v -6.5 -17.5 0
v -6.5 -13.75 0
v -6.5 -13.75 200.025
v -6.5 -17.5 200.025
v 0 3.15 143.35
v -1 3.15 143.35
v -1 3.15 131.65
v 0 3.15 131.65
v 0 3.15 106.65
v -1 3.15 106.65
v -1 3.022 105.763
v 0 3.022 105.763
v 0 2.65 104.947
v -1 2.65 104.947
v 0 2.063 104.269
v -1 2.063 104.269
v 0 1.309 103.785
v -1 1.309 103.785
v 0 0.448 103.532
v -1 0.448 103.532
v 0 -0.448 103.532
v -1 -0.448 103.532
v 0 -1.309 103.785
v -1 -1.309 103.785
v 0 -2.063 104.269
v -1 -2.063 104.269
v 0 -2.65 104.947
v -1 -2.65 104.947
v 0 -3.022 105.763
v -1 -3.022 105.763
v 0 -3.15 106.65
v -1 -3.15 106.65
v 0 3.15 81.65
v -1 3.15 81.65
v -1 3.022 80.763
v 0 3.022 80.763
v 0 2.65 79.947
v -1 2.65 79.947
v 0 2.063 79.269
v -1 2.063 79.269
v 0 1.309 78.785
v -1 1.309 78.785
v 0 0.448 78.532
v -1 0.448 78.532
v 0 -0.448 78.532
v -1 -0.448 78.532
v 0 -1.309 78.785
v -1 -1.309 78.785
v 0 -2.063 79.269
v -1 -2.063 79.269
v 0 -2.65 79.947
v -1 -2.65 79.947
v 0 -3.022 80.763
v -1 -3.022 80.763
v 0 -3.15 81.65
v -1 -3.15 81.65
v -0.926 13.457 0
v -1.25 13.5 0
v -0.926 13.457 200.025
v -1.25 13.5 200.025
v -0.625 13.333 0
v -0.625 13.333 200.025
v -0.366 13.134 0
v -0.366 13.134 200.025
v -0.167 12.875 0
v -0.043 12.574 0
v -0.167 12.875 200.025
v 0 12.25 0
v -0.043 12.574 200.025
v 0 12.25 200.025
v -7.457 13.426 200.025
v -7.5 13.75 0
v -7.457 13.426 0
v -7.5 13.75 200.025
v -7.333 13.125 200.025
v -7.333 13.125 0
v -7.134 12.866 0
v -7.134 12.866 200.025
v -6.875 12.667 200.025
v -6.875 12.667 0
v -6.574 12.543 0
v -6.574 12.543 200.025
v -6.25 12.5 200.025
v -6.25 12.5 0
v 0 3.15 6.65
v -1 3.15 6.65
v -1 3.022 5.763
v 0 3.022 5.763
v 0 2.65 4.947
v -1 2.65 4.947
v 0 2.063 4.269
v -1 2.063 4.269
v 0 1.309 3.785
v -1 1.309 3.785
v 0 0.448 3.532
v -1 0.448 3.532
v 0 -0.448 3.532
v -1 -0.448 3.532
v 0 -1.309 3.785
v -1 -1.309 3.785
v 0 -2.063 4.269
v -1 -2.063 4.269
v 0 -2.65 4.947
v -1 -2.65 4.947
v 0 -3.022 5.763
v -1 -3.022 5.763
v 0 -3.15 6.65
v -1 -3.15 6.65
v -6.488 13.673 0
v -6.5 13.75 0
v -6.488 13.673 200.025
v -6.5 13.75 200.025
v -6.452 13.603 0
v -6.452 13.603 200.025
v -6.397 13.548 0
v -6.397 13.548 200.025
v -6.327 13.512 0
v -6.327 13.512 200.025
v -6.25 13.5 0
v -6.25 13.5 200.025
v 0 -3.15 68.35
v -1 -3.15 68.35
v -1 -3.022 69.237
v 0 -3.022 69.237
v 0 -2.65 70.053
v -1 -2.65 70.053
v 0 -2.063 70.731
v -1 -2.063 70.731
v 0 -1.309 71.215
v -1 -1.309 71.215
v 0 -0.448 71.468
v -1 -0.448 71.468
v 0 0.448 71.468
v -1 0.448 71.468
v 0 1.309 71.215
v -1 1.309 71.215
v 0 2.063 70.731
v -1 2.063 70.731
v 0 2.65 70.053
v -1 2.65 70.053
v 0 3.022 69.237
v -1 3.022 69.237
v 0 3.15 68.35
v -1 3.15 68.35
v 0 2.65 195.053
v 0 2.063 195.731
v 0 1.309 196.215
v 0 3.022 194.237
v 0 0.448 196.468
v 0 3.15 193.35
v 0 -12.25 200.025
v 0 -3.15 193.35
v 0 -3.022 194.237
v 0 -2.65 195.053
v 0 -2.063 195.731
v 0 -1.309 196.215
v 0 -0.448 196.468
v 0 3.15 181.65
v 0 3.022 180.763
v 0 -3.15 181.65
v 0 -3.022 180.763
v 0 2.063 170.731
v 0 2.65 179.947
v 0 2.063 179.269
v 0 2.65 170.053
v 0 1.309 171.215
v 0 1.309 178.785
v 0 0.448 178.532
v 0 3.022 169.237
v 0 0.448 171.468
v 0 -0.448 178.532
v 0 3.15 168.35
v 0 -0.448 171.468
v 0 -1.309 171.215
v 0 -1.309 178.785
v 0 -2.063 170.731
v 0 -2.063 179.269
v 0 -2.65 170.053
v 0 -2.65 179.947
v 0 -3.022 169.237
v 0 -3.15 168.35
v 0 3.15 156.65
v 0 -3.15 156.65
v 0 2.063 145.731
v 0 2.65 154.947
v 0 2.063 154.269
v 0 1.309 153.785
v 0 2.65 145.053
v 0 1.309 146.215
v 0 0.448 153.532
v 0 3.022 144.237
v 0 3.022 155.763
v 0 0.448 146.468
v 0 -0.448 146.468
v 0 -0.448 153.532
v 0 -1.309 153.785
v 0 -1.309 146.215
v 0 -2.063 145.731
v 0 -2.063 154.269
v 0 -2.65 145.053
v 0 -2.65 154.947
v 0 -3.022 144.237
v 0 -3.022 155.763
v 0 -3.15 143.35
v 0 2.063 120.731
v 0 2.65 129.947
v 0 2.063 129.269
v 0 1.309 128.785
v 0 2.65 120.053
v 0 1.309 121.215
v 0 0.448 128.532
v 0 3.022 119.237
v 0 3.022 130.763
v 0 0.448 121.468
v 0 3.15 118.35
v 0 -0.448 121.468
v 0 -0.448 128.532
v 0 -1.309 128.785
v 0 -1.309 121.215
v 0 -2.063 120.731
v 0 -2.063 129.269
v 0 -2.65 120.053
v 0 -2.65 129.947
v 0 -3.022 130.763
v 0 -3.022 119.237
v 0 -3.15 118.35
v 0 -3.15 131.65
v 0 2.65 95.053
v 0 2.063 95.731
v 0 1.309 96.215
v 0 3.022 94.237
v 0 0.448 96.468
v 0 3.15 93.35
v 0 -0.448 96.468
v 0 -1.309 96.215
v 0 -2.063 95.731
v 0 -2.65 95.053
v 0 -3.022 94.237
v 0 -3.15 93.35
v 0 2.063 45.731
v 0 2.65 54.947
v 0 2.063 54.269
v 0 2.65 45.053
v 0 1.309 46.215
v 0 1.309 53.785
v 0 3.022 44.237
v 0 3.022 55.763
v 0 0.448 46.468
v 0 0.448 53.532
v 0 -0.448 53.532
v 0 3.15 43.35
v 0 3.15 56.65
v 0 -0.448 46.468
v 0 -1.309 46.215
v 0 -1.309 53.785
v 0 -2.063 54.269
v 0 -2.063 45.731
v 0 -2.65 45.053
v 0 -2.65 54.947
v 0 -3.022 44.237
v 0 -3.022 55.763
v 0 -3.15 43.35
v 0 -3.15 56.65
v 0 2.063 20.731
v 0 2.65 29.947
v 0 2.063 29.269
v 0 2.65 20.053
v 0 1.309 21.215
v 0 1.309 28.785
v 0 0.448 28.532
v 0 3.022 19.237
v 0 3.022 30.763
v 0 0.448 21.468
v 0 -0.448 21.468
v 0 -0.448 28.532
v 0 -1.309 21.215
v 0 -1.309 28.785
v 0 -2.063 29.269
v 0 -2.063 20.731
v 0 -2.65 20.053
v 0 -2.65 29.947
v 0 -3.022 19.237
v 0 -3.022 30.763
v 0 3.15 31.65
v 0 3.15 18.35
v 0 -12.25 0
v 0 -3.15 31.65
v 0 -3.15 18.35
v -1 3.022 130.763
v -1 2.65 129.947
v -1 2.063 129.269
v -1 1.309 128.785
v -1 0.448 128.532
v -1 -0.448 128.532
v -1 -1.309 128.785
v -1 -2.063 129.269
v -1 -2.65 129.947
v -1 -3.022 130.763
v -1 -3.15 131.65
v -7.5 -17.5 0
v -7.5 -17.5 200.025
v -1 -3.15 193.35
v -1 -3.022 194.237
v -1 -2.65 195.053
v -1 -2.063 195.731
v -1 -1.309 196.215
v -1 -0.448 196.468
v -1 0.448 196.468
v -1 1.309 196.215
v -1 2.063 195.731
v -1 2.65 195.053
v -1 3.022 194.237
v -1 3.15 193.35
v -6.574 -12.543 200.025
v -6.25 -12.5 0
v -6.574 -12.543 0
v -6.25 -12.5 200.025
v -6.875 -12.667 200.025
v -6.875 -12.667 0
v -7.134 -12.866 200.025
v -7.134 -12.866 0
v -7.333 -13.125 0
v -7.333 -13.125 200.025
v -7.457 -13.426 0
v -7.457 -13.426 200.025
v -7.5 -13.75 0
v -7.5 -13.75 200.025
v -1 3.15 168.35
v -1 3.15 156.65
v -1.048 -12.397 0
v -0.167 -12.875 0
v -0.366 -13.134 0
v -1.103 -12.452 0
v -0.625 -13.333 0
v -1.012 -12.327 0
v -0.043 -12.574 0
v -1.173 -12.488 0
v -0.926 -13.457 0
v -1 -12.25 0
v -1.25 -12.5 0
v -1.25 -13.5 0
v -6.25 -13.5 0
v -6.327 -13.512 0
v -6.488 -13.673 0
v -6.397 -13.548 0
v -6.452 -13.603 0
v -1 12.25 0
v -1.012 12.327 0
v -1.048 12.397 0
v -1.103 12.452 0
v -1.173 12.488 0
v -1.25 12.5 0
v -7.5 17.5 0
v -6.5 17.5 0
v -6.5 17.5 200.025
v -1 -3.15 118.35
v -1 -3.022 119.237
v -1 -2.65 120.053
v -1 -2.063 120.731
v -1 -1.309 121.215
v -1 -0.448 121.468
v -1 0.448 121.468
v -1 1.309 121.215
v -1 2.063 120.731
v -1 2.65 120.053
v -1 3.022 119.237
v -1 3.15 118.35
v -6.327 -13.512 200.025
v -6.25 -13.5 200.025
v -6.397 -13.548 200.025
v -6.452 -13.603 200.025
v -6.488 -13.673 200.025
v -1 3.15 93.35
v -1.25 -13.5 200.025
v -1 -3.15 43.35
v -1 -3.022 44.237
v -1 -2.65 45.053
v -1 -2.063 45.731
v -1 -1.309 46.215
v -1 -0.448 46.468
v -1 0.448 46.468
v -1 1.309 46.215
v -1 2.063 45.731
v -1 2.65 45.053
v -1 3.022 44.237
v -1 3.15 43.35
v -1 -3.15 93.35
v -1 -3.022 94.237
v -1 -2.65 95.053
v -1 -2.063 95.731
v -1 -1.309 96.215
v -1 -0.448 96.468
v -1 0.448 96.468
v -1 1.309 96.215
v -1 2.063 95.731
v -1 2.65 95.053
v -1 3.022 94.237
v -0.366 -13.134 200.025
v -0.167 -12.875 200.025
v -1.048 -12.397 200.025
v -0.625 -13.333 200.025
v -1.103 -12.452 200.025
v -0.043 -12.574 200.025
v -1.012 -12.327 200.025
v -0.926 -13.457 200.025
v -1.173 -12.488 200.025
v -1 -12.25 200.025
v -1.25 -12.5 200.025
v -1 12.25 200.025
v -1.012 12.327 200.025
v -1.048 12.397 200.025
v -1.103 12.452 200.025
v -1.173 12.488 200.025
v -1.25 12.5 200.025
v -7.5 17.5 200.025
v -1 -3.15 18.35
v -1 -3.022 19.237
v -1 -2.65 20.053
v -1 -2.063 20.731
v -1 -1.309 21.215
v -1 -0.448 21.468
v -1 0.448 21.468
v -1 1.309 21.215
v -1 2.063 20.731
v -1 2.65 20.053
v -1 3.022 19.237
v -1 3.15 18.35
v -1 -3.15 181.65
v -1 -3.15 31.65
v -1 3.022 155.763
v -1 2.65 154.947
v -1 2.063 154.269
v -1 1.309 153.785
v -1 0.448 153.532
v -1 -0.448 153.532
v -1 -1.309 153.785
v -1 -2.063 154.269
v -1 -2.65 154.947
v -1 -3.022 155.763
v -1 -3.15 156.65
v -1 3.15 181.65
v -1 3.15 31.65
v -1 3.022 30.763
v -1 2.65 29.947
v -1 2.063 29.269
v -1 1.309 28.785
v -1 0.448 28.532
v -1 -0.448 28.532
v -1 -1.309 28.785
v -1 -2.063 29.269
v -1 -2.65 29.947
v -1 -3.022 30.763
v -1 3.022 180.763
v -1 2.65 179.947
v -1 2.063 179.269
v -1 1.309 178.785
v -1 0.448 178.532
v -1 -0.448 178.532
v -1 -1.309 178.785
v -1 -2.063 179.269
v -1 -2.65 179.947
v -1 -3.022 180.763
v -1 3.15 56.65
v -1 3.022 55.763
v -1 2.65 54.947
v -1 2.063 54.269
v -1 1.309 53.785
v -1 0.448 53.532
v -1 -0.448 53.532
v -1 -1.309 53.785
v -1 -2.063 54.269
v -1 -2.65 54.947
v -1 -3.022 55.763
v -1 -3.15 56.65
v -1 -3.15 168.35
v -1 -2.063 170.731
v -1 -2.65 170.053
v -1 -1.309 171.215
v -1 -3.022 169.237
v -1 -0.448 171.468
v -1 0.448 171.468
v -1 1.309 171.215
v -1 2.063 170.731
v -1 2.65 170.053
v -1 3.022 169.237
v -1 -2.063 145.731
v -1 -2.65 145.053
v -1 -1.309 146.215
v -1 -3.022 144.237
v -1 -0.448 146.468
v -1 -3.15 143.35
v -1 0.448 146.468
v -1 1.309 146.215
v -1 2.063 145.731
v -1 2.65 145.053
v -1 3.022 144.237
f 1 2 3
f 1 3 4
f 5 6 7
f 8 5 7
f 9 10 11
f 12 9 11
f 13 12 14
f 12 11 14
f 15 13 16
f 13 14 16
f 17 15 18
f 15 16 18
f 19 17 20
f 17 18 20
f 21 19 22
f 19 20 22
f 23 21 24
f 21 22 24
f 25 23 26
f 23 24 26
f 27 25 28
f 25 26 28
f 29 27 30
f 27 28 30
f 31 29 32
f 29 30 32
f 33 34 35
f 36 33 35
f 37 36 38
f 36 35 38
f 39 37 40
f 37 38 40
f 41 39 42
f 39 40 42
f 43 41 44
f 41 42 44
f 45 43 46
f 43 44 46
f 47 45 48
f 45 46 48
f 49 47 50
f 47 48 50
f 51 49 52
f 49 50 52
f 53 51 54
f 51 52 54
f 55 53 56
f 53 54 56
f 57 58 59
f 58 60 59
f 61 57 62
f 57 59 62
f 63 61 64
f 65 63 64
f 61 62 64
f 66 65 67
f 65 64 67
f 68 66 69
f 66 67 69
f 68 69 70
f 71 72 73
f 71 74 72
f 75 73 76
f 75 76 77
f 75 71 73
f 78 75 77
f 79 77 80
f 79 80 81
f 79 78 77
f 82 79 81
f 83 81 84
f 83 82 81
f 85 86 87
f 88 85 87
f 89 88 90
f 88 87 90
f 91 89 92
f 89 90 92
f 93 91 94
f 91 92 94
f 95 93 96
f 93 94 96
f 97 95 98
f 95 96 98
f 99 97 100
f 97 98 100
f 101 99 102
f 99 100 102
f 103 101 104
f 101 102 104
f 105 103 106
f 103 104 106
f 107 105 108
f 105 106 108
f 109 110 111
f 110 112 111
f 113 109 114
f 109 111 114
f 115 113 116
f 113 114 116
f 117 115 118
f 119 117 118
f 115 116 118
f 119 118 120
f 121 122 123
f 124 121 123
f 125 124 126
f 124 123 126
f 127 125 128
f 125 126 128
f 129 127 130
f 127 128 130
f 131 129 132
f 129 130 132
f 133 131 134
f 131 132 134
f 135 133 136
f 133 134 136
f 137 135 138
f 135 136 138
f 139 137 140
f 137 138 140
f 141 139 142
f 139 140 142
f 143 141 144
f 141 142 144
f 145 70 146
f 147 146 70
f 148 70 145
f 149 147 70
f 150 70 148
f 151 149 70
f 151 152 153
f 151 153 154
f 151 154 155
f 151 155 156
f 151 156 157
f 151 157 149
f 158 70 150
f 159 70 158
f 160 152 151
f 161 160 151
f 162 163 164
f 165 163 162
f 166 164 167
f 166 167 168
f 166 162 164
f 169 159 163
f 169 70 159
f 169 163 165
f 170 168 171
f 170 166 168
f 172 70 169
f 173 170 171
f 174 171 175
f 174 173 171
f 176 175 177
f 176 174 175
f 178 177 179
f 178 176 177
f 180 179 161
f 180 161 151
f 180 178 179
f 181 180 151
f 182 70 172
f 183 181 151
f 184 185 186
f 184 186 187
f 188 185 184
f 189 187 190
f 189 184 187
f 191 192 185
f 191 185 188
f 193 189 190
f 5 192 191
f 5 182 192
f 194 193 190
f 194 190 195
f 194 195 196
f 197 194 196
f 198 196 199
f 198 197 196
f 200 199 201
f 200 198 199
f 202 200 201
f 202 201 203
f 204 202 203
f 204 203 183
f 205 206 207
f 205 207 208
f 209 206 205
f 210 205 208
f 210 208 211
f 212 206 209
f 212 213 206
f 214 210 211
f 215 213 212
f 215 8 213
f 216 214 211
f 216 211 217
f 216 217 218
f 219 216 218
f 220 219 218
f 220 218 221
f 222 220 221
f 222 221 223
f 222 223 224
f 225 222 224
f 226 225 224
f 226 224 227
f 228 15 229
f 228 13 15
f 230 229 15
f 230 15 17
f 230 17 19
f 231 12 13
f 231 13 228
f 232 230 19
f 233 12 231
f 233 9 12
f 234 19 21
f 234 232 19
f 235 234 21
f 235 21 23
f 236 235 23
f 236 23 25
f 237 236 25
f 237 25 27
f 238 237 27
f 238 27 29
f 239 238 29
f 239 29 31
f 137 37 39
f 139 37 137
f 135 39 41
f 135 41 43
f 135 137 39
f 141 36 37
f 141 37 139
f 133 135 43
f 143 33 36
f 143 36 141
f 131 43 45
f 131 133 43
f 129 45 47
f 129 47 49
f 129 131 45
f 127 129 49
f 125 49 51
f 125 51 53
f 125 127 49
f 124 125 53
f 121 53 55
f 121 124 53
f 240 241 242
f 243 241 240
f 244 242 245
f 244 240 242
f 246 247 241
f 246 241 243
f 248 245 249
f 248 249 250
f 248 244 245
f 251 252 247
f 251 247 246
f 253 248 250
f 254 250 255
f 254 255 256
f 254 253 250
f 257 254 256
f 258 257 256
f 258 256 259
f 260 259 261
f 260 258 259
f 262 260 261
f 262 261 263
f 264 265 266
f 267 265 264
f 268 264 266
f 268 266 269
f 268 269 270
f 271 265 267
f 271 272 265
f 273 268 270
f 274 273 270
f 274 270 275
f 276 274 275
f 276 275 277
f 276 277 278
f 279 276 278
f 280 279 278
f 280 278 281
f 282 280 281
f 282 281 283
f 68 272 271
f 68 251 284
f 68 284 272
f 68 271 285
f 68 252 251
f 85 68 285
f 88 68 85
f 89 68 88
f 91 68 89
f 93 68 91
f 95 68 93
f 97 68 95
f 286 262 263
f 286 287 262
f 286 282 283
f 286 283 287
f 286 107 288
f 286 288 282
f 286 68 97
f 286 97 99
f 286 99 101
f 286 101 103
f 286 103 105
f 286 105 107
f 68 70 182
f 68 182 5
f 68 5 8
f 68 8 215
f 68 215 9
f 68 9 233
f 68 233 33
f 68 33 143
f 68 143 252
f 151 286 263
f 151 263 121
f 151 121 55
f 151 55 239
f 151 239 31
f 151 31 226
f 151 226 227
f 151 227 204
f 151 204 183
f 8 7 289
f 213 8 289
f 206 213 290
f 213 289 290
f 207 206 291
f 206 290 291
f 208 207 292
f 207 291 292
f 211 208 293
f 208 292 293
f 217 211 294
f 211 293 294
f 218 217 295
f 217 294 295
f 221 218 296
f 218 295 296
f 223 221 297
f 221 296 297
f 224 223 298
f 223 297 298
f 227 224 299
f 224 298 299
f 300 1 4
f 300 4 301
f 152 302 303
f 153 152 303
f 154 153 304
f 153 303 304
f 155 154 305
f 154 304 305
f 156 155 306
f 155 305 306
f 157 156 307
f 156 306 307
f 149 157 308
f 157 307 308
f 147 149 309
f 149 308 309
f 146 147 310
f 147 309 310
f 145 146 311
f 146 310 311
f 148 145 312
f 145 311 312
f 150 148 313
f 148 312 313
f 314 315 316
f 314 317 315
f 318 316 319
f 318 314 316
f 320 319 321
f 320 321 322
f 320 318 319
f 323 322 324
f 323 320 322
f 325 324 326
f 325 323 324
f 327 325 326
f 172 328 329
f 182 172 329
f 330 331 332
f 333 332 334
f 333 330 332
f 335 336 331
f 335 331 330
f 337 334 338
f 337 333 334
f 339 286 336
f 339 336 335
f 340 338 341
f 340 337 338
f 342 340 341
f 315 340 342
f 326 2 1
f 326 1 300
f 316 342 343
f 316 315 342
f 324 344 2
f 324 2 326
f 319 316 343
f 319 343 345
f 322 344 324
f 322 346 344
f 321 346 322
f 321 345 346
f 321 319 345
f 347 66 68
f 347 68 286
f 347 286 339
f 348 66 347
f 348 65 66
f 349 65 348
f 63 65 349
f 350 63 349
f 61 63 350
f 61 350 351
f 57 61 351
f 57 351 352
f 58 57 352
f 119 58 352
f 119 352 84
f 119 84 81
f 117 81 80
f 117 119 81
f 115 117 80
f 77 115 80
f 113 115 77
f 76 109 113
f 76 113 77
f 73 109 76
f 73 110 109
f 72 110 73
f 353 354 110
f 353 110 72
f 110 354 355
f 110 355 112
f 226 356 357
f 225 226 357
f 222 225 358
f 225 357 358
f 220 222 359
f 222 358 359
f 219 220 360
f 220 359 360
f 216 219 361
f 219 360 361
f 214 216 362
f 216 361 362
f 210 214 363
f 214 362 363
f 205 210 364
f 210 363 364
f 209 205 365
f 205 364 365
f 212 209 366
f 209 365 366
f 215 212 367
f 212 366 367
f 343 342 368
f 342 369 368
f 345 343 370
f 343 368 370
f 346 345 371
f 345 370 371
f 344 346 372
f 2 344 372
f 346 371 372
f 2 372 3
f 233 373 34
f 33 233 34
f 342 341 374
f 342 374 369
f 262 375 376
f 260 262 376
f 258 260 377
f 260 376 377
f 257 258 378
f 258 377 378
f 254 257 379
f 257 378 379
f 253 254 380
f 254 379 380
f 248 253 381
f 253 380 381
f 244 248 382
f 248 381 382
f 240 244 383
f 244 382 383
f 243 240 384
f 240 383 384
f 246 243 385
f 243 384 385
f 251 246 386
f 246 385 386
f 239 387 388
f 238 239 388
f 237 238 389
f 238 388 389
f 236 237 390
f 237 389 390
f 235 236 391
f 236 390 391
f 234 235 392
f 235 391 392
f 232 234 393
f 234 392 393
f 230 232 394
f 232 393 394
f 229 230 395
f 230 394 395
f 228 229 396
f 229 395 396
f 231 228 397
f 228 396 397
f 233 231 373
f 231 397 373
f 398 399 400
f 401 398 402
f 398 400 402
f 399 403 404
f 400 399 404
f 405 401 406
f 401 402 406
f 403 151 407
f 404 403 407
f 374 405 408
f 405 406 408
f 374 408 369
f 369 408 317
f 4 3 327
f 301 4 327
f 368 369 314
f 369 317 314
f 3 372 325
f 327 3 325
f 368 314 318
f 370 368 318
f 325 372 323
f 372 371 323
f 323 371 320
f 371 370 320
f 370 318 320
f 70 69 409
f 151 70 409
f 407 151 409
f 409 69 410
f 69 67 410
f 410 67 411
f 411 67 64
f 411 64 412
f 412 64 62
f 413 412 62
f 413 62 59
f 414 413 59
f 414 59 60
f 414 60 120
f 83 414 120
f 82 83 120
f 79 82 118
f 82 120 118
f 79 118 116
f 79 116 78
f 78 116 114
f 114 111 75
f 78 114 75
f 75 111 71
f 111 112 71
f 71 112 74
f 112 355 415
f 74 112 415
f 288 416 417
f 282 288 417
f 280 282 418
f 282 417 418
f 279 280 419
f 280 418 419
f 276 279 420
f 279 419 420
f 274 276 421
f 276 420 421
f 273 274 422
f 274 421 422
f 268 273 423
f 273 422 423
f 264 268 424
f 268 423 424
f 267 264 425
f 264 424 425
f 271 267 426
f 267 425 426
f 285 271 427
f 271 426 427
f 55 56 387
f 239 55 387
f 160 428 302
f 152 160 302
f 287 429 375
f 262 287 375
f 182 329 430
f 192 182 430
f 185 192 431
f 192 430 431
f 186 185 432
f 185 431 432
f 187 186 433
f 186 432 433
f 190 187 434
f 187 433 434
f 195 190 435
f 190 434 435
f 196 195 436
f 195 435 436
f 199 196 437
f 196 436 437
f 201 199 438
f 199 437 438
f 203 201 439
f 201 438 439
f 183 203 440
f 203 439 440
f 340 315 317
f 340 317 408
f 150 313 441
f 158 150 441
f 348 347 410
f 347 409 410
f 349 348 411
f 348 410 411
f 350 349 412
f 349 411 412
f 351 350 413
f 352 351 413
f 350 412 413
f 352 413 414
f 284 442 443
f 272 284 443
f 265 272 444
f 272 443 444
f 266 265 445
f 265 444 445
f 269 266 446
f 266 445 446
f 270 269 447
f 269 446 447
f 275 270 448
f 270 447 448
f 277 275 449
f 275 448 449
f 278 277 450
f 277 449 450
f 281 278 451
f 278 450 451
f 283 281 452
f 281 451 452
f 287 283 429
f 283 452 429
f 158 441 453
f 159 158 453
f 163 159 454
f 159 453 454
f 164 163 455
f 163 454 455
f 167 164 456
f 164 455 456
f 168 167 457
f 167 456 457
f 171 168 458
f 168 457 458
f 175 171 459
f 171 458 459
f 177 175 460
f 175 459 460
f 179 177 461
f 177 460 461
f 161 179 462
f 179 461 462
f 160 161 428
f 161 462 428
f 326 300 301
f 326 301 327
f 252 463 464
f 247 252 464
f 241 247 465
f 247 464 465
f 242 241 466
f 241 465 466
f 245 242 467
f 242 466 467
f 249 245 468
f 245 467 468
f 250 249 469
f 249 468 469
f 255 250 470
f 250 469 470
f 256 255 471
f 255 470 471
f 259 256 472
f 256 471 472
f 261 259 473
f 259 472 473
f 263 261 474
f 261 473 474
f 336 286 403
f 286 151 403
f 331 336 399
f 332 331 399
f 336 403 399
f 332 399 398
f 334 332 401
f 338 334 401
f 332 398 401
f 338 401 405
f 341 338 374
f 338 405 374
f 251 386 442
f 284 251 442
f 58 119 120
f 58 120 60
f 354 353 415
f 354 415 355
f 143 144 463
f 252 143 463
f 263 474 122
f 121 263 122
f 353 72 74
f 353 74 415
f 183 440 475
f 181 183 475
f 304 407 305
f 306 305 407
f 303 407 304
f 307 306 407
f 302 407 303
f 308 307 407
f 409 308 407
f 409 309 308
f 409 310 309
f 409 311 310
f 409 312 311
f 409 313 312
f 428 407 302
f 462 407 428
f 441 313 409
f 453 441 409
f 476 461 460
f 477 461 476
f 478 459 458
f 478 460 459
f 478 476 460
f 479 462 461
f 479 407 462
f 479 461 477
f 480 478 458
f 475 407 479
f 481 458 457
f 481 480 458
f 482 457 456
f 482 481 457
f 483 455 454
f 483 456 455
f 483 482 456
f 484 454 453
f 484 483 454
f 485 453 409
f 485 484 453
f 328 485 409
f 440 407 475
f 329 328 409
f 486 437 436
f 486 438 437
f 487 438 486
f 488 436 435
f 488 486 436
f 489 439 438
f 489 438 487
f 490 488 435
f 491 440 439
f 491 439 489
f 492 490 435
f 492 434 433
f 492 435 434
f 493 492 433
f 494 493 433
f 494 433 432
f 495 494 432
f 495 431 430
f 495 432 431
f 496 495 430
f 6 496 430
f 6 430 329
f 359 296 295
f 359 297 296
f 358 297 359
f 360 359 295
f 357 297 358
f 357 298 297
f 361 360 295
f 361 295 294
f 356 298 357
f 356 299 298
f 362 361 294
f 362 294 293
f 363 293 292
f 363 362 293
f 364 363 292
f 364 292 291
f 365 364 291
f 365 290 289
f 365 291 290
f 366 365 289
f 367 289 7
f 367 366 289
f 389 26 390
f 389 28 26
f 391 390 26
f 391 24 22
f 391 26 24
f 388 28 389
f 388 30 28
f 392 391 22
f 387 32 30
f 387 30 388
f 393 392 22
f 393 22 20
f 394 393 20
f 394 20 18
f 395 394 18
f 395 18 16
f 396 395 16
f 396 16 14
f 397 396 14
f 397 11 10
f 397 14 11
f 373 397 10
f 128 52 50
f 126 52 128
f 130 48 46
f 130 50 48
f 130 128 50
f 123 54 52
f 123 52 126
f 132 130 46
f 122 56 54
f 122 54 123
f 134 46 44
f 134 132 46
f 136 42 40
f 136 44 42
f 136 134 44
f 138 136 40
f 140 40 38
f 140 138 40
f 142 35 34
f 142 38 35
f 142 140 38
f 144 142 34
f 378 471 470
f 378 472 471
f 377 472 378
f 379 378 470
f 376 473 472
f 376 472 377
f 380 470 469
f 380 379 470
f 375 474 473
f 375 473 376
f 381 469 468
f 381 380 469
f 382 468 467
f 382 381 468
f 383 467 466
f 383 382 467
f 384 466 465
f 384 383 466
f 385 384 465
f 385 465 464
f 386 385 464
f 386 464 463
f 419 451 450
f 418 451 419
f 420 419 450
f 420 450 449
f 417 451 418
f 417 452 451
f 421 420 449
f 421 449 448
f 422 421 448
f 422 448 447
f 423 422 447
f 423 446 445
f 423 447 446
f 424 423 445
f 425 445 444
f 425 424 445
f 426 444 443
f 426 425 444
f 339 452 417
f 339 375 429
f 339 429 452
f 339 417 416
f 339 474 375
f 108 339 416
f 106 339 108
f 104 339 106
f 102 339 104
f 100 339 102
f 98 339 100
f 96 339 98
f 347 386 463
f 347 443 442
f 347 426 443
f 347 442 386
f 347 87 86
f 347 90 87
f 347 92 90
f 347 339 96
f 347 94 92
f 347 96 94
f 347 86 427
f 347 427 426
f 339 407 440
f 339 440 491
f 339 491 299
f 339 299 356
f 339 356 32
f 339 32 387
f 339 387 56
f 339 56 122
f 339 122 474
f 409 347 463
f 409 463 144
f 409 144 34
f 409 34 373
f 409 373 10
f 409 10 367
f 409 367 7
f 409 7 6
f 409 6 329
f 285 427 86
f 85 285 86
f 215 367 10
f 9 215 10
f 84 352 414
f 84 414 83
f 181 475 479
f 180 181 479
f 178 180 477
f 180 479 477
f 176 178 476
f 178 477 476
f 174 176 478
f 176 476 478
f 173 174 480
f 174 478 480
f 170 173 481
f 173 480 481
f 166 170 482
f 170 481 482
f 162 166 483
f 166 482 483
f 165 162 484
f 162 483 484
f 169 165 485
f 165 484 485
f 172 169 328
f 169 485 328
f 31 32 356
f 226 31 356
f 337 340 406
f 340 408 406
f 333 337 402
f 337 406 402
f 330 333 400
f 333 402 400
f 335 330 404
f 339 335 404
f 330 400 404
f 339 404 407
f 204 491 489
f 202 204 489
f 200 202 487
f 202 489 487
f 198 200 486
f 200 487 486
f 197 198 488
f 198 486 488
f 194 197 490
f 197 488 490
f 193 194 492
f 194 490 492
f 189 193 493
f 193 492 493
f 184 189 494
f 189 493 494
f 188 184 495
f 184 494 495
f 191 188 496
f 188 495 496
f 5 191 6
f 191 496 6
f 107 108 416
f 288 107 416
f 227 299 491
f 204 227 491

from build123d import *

# Parameters (mm, degrees)
EXTRUDE_THIN1_DEPTH = 200.025
CUT_EXTRUDE1_START  = -8.5
CUT_EXTRUDE1_DEPTH  = 9.5
LPATTERN1_COUNT     = 32
LPATTERN1_PITCH     = 25
FILLET1_R           = 0.25
FILLET2_R           = 1.25


with BuildPart() as part:
    # Sketch3 → Extrude-Thin1 (new body)
    with BuildSketch(Plane.XY):
        Polygon((-6.5, 17.5), (-6.5, 13.5), (0, 13.5), (0, -13.5), (-6.5, -13.5), (-6.5, -17.5), (-7.5, -17.5), (-7.5, -12.5), (-1, -12.5), (-1, 12.5), (-7.5, 12.5), (-7.5, 17.5), align=None)
    extrude(amount=EXTRUDE_THIN1_DEPTH)

    # Sketch4 → Cut-Extrude1 (cut)
    with BuildSketch(Plane(origin=(0, 0, 0), x_dir=(0, 0, -1), z_dir=(1, 0, 0)).offset(CUT_EXTRUDE1_START)):
        with BuildLine():
            Line((-6.65, -3.15), (-18.35, -3.15))
            ThreePointArc((-18.35, -3.15), (-21.5, 0), (-18.35, 3.15))
            Line((-18.35, 3.15), (-6.65, 3.15))
            ThreePointArc((-6.65, 3.15), (-3.5, 0), (-6.65, -3.15))
        make_face()
    cut_extrude1 = extrude(amount=CUT_EXTRUDE1_DEPTH, mode=Mode.SUBTRACT)

    # LPattern1: Cut-Extrude1 ×32
    with Locations(*[(0, 0, i * LPATTERN1_PITCH) for i in range(1, LPATTERN1_COUNT)]):
        add(cut_extrude1, mode=Mode.SUBTRACT)

    # Fillet1
    fillet1_edges = [part.edges().sort_by_distance(p)[0] for p in [
        (-6.5, 13.5, 100.0125),
        (-6.5, -13.5, 100.0125),
        (-1, -12.5, 100.0125),
        (-1, 12.5, 100.0125),
    ]]
    fillet(fillet1_edges, radius=FILLET1_R)

    # Fillet2
    fillet2_edges = [part.edges().sort_by_distance(p)[0] for p in [
        (0, 13.5, 100.0125),
        (0, -13.5, 100.0125),
        (-7.5, -12.5, 100.0125),
        (-7.5, 12.5, 100.0125),
    ]]
    fillet(fillet2_edges, radius=FILLET2_R)


solid = part.part
